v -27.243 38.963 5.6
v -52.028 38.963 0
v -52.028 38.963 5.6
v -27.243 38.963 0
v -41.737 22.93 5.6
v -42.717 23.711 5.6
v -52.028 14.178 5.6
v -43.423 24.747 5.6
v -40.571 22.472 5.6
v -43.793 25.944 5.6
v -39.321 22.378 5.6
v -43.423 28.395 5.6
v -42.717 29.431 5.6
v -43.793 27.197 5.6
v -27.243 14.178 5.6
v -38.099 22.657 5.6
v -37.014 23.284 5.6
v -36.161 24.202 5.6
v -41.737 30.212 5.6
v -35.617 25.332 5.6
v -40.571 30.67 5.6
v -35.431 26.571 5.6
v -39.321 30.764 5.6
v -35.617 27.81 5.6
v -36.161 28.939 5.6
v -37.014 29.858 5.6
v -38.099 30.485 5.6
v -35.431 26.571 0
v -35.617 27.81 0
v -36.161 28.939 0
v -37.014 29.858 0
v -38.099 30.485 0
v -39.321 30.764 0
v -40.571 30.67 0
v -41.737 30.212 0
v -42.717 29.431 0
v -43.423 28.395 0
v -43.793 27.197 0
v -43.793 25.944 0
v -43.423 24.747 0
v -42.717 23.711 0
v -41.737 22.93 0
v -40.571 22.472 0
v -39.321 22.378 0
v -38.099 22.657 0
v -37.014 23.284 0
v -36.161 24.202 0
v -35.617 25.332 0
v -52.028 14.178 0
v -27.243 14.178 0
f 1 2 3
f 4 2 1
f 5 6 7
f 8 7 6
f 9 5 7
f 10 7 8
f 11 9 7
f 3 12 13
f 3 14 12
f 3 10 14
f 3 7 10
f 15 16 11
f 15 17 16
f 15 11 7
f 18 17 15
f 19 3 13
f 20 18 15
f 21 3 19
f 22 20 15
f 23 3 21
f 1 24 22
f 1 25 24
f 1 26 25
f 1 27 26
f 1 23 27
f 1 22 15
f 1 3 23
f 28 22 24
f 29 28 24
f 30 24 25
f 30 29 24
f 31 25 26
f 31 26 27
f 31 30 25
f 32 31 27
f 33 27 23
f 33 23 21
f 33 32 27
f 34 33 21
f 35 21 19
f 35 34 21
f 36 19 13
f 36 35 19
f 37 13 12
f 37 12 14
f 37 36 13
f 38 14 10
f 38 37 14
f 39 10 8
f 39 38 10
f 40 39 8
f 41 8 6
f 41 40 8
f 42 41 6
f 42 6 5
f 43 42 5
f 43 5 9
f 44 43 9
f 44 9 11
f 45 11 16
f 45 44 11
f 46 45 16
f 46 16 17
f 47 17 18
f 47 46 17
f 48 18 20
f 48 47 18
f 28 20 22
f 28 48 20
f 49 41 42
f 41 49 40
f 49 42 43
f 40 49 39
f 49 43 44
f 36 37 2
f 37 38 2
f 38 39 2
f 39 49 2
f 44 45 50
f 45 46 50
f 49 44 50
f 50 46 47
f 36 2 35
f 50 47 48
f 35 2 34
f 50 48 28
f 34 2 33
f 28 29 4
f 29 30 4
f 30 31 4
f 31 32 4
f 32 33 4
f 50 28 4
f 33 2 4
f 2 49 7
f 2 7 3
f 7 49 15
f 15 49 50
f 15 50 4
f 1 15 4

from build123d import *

# Parameters (mm, degrees)
F0_W      = 24.785
F0_H      = 24.785
F0_R      = 4.2045
F1_DEPTH  = 5.6
F1_FACE_W = 24.785
F1_FACE_H = 24.785
F1_FACE_R = 4.2045
F2_DEPTH  = 1.6


with BuildPart() as f1:
    # F0 (on Top) → F1 (new body)
    with BuildSketch(Plane.XY):
        with Locations((-39.635155, 26.570821)):
            Rectangle(F0_W, F0_H)
        with Locations((-39.635155, 26.570821)):
            Circle(F0_R, mode=Mode.SUBTRACT)
    extrude(amount=F1_DEPTH)

    # F1_face (on face) → F2 (join)
    with BuildSketch(Plane(origin=(-39.635155, 26.570821, 5.6), x_dir=(1, 0, 0), z_dir=(0, 0, 1))):
        Rectangle(F1_FACE_W, F1_FACE_H)
        Circle(F1_FACE_R, mode=Mode.SUBTRACT)
    extrude(amount=-F2_DEPTH)


solid = f1.part
